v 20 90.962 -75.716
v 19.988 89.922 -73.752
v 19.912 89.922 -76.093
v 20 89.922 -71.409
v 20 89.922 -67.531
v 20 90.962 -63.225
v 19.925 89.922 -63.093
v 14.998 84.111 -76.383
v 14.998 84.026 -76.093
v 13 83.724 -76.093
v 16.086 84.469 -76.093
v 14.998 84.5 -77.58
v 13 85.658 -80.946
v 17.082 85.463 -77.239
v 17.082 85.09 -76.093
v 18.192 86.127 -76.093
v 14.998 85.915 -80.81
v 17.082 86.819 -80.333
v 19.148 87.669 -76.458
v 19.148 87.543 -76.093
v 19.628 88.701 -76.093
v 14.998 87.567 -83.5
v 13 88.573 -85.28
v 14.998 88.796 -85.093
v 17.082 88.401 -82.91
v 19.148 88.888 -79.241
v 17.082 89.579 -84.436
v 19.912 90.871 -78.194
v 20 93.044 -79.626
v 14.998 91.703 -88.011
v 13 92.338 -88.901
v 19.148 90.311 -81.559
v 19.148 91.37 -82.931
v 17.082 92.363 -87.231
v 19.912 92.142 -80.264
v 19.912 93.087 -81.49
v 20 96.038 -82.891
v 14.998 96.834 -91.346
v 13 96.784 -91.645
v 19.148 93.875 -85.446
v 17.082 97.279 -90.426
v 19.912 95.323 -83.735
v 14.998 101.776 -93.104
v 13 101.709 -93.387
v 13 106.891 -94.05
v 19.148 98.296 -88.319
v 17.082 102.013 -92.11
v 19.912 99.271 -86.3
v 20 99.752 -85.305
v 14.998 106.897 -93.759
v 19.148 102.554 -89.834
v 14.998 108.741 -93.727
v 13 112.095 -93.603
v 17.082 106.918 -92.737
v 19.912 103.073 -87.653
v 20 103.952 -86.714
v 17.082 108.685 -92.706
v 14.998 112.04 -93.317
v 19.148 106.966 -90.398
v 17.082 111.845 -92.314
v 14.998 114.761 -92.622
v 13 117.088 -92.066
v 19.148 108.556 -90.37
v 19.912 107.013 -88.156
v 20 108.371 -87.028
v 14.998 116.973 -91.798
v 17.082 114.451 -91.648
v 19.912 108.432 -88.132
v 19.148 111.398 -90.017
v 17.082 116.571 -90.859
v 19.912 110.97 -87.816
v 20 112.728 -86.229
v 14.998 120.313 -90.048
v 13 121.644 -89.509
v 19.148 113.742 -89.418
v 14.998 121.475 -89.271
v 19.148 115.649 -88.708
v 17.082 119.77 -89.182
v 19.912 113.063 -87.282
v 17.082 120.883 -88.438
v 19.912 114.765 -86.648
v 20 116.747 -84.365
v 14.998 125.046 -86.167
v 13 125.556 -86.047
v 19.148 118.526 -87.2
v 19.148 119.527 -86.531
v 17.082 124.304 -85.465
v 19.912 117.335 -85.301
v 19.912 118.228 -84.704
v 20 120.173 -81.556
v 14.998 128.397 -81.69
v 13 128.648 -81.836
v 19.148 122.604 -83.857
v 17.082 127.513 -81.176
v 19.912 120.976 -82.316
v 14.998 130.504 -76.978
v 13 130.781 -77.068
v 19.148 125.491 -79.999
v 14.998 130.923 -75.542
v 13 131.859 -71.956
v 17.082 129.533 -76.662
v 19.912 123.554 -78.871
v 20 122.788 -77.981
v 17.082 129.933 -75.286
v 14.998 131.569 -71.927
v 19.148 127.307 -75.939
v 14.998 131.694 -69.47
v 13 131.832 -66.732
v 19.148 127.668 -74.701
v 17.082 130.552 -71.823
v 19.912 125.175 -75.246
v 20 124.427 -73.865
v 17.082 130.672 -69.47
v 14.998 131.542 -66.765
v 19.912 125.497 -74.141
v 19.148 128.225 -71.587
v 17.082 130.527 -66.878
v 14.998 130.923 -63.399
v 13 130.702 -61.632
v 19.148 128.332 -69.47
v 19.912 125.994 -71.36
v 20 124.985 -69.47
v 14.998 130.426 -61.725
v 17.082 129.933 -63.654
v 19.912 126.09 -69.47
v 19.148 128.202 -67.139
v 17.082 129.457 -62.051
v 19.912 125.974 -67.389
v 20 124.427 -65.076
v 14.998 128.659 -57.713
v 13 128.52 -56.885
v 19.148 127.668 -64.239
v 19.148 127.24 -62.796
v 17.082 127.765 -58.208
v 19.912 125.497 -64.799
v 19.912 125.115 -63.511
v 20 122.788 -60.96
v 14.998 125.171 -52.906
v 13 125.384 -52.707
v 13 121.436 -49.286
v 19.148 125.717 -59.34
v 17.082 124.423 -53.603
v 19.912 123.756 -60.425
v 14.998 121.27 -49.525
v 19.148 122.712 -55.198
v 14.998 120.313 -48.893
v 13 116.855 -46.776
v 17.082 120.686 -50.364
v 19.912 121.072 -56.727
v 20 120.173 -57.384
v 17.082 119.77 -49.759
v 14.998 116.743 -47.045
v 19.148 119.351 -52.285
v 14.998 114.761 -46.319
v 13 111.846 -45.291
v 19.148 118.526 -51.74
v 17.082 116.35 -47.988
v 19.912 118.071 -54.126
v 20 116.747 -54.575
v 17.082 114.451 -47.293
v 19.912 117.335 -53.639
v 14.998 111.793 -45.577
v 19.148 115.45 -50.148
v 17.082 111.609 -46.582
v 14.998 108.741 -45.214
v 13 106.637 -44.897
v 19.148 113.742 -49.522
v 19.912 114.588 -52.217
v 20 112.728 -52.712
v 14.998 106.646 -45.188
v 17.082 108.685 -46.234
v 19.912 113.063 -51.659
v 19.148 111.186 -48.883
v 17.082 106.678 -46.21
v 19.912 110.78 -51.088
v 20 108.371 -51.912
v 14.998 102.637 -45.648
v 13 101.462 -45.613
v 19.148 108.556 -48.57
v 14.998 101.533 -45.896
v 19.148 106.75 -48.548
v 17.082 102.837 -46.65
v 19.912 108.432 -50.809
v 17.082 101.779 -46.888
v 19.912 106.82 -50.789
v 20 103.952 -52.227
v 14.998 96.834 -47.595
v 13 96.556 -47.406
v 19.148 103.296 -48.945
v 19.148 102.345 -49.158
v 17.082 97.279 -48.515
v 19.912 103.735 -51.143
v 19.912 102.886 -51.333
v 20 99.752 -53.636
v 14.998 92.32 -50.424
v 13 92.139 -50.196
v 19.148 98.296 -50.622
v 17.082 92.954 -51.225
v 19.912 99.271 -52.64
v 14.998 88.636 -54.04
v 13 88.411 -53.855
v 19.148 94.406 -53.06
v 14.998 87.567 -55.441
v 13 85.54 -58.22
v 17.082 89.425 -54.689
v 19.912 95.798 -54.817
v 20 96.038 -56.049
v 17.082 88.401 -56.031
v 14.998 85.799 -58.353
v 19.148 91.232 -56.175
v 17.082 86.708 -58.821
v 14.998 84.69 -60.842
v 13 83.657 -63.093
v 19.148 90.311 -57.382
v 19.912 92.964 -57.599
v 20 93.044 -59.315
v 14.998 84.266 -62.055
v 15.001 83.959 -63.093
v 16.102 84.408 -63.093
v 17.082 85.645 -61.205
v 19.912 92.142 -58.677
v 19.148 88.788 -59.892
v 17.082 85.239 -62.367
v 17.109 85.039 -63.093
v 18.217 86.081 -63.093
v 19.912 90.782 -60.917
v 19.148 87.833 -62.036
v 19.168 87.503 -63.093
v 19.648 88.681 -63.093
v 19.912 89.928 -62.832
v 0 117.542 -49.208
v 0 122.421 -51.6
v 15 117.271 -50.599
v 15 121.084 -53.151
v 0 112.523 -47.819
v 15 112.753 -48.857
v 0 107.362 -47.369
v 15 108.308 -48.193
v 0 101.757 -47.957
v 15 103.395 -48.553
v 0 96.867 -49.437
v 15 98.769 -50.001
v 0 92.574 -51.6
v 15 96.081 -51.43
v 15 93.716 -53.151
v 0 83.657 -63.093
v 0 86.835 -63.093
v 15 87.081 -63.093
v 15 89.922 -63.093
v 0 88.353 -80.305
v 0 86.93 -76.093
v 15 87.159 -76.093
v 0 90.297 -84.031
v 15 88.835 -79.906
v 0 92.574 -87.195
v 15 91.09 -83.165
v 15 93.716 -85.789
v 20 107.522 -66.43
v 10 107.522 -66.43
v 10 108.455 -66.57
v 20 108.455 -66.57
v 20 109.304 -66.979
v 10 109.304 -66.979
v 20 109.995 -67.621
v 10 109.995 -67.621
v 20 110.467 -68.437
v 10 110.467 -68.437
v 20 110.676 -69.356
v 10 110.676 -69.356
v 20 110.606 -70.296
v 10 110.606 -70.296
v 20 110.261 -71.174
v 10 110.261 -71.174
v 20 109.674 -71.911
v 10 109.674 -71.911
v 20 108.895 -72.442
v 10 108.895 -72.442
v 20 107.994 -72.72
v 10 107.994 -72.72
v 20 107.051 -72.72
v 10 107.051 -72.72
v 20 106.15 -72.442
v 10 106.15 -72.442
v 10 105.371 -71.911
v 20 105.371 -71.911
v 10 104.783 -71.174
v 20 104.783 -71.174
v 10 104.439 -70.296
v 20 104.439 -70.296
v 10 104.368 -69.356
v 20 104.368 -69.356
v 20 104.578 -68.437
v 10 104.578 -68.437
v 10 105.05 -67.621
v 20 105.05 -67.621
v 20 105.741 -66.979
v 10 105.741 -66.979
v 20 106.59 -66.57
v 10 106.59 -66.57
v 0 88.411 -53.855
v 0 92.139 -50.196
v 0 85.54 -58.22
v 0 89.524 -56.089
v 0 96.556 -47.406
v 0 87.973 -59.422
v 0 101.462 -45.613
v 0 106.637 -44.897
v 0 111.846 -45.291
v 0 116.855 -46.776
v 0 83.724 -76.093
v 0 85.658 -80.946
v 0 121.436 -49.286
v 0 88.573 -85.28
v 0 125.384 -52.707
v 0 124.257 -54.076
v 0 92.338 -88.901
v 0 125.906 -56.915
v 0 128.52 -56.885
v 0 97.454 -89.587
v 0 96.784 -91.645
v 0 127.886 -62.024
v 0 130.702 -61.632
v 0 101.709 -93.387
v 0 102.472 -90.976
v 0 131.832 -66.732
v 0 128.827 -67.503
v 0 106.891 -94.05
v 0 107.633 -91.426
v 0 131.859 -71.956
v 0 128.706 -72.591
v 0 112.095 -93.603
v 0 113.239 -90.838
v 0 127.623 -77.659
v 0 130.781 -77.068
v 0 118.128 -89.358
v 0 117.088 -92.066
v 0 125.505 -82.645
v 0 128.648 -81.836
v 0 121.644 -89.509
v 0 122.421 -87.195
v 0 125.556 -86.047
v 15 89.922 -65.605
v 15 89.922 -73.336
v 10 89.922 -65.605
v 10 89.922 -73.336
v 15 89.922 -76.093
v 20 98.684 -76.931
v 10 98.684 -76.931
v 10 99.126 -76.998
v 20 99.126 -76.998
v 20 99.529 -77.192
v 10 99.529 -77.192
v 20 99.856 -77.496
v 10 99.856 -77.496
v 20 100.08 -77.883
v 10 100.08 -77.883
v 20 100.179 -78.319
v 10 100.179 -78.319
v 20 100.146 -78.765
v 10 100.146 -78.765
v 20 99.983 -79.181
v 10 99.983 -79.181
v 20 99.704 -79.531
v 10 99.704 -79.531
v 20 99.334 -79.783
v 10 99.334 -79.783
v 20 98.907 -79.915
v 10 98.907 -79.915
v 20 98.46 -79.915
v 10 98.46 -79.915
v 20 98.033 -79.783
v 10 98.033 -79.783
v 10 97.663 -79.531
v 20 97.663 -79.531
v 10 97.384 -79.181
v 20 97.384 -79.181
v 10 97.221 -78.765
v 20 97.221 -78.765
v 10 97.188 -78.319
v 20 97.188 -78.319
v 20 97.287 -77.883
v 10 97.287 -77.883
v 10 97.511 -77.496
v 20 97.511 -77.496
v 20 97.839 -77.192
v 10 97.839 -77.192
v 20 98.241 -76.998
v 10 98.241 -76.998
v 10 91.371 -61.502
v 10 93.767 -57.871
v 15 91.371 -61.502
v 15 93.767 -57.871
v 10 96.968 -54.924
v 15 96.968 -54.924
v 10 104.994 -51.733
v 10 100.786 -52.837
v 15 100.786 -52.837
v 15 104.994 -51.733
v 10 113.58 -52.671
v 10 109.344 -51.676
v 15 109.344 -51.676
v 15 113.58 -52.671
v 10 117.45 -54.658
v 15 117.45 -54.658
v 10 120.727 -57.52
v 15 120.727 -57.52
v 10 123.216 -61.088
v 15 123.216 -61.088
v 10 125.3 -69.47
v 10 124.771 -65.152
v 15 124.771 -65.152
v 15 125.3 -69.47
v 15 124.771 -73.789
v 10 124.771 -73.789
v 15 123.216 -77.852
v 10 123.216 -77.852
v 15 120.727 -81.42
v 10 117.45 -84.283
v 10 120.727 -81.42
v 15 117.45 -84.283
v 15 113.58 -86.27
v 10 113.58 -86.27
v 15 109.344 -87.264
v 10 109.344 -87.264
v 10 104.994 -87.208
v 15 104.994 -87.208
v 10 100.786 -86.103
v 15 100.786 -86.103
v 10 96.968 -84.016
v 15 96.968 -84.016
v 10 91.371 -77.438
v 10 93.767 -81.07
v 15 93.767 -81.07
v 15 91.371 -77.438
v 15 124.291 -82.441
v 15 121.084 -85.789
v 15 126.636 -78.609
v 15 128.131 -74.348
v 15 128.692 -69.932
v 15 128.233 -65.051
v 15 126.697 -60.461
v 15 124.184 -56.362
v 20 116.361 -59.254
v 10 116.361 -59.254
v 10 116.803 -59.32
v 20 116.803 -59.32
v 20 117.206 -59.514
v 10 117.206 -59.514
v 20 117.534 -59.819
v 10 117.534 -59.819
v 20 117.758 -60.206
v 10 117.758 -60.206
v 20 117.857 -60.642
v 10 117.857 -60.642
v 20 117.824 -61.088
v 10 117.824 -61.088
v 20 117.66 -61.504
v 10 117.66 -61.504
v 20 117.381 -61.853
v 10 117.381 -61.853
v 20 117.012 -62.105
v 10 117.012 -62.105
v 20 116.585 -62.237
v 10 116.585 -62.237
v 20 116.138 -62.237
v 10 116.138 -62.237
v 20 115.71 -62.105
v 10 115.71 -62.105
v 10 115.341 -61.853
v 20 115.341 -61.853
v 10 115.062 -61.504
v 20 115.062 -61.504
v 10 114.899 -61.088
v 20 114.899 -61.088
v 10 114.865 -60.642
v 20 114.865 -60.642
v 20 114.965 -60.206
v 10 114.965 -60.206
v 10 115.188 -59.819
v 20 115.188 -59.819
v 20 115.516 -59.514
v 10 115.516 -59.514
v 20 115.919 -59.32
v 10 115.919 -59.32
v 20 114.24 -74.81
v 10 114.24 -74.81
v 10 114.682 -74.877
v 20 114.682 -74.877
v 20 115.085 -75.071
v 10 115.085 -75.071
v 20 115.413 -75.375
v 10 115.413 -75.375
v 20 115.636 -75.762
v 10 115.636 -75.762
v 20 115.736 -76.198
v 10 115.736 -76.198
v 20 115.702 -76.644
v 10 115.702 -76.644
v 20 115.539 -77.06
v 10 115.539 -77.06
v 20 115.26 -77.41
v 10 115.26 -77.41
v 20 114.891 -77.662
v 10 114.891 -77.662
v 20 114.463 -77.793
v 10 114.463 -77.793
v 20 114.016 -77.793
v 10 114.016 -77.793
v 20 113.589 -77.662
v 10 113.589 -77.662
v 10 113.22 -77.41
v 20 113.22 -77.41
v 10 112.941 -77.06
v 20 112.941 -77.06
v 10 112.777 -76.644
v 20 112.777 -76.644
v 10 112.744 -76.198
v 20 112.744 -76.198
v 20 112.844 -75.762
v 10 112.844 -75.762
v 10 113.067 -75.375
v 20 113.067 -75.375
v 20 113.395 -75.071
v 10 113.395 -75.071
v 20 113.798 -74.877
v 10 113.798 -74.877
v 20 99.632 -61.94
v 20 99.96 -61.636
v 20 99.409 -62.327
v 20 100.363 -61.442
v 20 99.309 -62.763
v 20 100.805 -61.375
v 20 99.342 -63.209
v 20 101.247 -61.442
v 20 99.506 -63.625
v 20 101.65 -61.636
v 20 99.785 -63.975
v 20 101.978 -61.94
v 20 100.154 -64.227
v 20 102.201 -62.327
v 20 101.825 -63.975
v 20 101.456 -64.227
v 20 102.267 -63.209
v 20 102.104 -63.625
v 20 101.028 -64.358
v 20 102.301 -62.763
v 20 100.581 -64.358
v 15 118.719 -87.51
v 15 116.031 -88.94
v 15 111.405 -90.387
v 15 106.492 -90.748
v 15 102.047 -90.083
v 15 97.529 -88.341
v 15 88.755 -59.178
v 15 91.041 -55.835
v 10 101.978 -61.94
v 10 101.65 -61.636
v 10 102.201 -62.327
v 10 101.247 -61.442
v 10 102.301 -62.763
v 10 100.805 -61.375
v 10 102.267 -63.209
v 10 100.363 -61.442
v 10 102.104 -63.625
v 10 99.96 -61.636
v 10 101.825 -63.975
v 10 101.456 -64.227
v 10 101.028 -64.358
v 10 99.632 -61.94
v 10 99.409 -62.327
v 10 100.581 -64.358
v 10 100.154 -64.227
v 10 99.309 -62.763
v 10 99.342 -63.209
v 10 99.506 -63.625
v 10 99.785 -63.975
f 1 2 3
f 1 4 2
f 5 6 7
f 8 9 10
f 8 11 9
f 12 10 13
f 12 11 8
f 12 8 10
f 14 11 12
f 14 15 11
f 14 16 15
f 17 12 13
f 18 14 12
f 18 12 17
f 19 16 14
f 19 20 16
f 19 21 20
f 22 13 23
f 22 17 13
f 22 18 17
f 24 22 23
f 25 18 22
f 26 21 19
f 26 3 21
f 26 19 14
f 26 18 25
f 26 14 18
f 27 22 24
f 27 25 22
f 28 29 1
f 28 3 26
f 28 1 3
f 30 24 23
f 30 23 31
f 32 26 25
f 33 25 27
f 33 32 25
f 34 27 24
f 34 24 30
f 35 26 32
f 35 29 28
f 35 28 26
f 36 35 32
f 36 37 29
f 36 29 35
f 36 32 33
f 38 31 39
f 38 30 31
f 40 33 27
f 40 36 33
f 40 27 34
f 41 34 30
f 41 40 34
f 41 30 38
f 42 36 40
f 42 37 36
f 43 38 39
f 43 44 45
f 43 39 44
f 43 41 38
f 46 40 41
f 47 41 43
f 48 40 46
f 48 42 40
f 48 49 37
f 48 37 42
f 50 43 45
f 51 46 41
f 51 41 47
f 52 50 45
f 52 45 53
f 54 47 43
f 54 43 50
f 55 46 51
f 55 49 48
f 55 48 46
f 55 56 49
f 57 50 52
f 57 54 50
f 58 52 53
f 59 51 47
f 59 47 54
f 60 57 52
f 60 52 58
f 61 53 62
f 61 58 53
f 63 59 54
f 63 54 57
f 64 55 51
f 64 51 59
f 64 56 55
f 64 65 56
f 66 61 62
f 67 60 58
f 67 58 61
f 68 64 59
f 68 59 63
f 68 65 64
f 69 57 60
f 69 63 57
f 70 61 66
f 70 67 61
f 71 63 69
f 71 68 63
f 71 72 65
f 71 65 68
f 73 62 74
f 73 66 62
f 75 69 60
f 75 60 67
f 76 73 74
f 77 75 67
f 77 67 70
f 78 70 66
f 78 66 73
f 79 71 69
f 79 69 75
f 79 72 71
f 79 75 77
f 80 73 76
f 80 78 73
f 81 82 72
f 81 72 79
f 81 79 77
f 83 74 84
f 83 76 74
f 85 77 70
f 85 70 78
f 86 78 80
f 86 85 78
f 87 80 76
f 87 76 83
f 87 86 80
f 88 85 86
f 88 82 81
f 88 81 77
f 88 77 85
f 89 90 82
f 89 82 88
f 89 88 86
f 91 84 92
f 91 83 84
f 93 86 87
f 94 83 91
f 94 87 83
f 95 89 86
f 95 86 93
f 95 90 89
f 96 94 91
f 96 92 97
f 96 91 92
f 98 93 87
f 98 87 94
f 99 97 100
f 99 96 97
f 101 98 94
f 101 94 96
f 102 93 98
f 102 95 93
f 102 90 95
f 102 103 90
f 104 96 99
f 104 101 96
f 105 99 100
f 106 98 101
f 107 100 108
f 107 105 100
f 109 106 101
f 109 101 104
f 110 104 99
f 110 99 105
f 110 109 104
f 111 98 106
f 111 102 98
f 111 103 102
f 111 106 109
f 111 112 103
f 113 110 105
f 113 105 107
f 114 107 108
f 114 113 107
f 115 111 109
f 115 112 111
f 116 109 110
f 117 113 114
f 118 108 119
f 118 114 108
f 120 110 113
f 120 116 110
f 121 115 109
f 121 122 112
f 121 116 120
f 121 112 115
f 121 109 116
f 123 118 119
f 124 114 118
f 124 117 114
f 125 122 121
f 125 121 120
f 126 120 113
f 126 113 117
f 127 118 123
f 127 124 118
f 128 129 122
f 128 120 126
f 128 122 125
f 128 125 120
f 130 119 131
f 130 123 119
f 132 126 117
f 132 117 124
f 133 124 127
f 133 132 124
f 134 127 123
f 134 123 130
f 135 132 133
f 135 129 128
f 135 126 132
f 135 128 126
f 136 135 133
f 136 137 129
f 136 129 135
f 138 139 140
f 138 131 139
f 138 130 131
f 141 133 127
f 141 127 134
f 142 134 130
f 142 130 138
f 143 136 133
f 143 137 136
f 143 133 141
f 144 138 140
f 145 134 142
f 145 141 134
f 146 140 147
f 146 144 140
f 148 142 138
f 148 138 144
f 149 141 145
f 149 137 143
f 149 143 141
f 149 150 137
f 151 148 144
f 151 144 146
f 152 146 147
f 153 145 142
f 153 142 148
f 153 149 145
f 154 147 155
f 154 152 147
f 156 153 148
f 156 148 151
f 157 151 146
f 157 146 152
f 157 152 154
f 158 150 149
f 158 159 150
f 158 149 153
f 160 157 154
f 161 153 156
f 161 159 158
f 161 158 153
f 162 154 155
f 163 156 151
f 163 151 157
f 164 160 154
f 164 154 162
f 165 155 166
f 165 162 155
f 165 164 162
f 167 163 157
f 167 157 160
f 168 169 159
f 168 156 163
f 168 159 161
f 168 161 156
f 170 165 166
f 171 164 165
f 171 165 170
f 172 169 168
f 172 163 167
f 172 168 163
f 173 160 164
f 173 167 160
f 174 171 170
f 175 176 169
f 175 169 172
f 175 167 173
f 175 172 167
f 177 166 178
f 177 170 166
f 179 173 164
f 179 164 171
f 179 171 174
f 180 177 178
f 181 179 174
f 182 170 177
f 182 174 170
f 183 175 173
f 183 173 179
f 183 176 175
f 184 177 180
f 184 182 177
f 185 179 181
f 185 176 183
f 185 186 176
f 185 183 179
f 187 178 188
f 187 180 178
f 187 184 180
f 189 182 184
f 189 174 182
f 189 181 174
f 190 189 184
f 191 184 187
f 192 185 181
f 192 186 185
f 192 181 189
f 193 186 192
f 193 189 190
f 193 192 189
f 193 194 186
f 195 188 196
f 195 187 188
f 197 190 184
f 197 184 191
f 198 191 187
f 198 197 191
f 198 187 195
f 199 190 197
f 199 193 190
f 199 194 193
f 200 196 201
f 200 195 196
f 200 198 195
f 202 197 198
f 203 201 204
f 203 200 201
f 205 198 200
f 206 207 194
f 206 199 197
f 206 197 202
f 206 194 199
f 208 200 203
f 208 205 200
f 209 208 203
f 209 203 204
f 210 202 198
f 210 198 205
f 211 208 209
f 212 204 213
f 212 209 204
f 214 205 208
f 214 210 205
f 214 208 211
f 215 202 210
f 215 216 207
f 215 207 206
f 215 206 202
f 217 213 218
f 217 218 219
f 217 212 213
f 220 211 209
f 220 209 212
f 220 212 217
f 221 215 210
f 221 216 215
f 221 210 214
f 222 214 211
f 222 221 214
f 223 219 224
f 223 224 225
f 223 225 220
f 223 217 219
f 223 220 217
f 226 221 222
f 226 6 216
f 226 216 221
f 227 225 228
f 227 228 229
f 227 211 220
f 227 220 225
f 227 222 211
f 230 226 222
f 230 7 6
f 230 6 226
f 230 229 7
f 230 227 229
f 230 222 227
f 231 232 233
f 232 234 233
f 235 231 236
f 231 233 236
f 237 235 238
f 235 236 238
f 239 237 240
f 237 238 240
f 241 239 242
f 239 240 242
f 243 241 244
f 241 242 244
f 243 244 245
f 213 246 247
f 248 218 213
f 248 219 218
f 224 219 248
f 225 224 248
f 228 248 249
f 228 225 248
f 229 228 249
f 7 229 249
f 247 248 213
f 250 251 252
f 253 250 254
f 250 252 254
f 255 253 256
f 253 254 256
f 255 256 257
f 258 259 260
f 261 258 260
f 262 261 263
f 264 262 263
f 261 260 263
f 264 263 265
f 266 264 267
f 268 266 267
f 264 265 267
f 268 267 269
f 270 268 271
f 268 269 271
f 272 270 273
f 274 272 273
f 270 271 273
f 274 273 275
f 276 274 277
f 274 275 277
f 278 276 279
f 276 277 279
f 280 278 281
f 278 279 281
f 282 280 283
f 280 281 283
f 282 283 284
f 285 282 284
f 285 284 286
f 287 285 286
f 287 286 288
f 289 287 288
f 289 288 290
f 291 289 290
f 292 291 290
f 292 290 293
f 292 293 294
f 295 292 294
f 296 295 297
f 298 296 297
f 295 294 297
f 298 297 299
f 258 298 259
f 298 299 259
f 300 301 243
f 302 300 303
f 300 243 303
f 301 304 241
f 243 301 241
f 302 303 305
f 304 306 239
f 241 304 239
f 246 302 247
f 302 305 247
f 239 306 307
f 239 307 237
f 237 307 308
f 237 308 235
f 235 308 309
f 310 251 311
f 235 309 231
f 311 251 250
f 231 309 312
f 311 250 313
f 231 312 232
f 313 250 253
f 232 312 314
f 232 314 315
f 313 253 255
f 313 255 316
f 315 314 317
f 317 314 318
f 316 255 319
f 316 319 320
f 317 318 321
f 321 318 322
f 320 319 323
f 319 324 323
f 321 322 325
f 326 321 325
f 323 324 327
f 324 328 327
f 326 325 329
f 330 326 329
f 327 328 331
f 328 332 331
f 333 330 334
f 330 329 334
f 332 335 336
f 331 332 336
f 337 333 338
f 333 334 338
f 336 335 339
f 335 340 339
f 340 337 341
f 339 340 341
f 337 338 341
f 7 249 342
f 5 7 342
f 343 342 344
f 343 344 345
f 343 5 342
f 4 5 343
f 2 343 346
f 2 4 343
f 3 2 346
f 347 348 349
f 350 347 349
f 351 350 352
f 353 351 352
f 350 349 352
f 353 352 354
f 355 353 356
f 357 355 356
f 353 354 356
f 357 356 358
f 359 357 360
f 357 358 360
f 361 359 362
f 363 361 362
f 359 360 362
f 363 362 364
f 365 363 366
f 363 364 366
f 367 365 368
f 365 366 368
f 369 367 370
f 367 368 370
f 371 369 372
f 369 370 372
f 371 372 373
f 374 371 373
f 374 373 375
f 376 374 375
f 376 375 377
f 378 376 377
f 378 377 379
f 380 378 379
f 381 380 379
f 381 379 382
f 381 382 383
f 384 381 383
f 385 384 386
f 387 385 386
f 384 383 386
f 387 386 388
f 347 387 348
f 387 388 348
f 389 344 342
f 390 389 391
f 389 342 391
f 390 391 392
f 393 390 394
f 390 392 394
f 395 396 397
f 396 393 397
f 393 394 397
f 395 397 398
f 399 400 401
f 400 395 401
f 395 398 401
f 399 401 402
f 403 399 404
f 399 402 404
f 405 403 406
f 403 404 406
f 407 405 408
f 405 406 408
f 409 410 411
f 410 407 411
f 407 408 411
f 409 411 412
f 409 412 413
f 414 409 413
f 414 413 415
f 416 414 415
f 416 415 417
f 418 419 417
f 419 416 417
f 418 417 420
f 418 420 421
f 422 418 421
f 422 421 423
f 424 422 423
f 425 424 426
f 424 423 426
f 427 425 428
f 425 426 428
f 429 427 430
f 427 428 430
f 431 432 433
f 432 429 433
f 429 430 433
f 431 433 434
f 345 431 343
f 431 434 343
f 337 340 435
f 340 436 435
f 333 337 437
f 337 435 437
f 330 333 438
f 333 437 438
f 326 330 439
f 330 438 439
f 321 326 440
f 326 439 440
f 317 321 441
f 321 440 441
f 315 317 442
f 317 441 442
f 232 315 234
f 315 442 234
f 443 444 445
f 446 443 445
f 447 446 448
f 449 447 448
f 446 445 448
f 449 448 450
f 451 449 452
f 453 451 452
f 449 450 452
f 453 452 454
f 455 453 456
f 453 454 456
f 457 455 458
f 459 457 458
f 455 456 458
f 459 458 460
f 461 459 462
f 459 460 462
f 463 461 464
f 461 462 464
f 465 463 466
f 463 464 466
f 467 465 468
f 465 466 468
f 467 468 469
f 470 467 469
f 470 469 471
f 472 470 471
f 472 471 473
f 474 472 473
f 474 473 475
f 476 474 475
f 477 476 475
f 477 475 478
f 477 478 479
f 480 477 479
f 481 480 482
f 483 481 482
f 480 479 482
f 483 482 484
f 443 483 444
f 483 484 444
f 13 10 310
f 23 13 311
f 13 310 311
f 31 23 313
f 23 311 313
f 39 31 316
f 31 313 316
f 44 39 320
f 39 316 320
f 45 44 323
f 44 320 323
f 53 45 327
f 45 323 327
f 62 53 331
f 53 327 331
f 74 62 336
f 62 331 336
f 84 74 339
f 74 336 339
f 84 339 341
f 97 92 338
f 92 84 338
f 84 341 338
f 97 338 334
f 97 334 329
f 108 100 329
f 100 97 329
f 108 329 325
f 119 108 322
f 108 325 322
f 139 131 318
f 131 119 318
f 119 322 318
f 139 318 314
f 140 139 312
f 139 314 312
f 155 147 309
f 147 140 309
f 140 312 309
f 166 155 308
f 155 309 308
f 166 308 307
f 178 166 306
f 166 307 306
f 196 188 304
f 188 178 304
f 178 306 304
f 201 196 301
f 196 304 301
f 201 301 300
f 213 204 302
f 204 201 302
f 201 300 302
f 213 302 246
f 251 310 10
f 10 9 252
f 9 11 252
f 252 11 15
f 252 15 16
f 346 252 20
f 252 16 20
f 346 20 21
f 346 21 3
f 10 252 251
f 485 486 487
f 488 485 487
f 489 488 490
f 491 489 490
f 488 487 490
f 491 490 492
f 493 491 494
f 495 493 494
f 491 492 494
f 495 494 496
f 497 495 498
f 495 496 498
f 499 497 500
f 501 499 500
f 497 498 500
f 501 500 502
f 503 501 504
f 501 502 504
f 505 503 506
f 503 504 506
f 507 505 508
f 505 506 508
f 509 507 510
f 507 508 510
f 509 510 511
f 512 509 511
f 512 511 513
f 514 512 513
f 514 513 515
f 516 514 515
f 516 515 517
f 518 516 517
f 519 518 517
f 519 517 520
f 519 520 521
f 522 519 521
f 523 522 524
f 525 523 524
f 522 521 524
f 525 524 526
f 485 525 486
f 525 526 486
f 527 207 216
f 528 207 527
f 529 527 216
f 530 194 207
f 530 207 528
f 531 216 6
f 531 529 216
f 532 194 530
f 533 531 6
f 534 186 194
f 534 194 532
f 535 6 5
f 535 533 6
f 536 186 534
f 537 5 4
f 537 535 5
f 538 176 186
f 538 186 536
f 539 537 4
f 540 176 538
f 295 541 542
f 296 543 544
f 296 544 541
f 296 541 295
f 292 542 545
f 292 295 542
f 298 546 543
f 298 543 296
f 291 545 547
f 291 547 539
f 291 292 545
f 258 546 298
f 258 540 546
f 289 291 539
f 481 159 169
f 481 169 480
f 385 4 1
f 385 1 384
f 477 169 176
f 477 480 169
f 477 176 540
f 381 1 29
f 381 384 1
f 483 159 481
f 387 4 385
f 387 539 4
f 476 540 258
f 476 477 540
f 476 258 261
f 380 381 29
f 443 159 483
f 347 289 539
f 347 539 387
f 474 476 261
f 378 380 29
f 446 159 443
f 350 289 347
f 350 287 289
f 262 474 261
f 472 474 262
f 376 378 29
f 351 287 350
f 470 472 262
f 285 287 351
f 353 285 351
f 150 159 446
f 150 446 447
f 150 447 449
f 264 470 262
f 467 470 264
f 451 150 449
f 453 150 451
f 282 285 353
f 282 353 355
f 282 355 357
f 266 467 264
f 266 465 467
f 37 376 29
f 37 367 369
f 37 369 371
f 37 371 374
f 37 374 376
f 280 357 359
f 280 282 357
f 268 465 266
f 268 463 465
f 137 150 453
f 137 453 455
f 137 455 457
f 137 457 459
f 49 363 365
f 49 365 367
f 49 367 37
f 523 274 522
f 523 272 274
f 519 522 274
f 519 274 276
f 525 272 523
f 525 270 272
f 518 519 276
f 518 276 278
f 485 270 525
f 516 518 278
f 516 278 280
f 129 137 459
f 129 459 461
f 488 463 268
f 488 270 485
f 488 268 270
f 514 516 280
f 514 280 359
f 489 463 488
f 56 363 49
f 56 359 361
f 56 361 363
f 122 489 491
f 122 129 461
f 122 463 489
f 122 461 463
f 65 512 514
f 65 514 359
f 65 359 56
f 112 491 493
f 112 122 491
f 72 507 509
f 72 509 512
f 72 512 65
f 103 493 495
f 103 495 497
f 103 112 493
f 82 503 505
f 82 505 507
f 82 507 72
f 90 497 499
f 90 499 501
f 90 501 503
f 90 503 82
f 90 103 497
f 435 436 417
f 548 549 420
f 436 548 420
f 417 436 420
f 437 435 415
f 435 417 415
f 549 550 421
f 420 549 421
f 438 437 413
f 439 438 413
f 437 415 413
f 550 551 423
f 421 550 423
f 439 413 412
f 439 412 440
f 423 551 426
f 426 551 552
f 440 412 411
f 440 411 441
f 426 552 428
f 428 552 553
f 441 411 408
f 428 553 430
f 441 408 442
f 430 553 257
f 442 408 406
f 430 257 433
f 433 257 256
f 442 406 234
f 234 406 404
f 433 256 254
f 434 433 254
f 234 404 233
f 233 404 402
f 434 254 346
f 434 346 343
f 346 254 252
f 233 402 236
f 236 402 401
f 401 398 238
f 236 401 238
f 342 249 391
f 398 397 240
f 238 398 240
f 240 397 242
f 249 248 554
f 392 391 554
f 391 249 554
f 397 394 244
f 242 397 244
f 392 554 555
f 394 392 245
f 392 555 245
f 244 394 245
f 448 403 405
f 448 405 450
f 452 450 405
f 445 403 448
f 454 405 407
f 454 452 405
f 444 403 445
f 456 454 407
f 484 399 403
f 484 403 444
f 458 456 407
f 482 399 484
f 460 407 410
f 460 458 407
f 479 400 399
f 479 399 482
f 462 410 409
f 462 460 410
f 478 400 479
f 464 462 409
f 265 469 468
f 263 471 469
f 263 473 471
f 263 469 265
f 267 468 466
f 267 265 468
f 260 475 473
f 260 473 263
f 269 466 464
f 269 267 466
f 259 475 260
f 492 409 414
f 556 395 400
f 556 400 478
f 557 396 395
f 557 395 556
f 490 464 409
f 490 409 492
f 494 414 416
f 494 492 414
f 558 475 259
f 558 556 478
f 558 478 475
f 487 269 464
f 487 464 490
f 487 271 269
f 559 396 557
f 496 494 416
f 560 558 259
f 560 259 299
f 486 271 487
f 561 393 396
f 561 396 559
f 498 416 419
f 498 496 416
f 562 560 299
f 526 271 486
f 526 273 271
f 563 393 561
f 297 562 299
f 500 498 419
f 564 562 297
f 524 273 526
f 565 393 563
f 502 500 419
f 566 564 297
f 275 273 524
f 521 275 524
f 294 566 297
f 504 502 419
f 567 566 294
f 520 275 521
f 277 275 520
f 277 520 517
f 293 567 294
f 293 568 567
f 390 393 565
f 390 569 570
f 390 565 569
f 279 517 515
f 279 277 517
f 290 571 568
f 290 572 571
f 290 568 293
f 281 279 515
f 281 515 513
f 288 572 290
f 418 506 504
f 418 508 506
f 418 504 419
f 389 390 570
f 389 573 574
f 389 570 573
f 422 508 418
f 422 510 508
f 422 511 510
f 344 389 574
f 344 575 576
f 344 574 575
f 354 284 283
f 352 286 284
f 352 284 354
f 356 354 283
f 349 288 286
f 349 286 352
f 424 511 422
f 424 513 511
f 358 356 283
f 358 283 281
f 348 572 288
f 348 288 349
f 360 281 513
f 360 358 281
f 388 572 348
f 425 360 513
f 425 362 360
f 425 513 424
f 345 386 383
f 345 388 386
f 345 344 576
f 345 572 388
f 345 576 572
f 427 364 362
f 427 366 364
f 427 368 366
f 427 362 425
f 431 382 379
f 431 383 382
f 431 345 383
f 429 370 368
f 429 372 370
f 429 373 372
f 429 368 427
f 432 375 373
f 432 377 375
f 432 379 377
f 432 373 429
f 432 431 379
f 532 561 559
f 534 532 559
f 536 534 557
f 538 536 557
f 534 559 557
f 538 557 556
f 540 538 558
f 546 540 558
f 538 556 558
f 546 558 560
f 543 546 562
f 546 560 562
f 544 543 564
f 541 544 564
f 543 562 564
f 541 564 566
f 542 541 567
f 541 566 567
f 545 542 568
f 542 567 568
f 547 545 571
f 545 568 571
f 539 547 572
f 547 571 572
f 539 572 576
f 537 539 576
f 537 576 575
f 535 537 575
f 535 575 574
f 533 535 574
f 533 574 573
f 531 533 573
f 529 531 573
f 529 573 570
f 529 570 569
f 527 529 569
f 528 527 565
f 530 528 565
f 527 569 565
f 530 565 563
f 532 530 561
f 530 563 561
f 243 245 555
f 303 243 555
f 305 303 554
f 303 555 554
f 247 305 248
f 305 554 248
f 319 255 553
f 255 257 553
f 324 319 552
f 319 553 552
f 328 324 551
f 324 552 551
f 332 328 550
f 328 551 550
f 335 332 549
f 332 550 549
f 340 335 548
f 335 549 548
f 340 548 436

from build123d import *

# Parameters (mm, degrees)
SKETCH1_R           = 24.584865892
BOSS_EXTRUDE4_DEPTH = 20
SKETCH5_R           = 17.9
BOSS_EXTRUDE5_DEPTH = 5
SKETCH6_R           = 1.5
SKETCH6_R_2         = 3.162859367
CUT_EXTRUDE1_DEPTH  = 10
FILLET1_R           = 7
SKETCH8_W           = 13
SKETCH8_H           = 8.974684843
CUT_EXTRUDE2_DEPTH  = 30


with BuildPart() as part:
    # Sketch1 → Boss-Extrude4 (new body)
    with BuildSketch(Plane(origin=(0, 0, 0), x_dir=(0, 0, -1), z_dir=(1, 0, 0))):
        with Locations((69.470275966, 107.4)):
            Circle(SKETCH1_R)
    extrude(amount=BOSS_EXTRUDE4_DEPTH)

    # Cut-Loft1: read off the stored shape, not the designer's step
    # Cut-Loft1: loft between two sections, ruled curve by curve
    cut_loft1_from = [
        Edge.make_bspline([(0, 122.421030793, -51.5998214), (0, 121.403963567, -50.977061653), (0, 120.31454314, -50.395752434), (0, 118.005938422, -49.358232659), (0, 116.786749472, -48.902260973), (0, 114.249384519, -48.15409937), (0, 112.931336418, -47.862145319), (0, 110.241321726, -47.469427252), (0, 108.869602219, -47.368811755), (0, 106.125867826, -47.368811755), (0, 104.754148319, -47.469427252), (0, 102.064133627, -47.862145319), (0, 100.746085526, -48.15409937), (0, 98.208720572, -48.902260973), (0, 96.989531623, -49.358232659), (0, 94.680926905, -50.395752434), (0, 93.591506478, -50.977061653), (0, 92.574439252, -51.5998214)], [0, 0, 0, 0, 0.125, 0.125, 0.25, 0.25, 0.375, 0.375, 0.5, 0.5, 0.625, 0.625, 0.75, 0.75, 0.875, 0.875, 1, 1, 1, 1], 3),
        Edge.make_bspline([(0, 92.574439252, -51.5998214), (0, 91.688670965, -52.66973324), (0, 90.833868812, -53.859032932), (0, 89.270225328, -56.474339023), (0, 88.562039976, -57.900649218), (0, 87.380791607, -60.949300184), (0, 86.90857847, -62.571462387), (0, 86.269439046, -65.928597857), (0, 86.103133633, -67.662819685), (0, 86.103133633, -71.132277338), (0, 86.269439046, -72.866499165), (0, 86.90857847, -76.223634636), (0, 87.380791607, -77.845796839), (0, 88.562039976, -80.894447804), (0, 89.270225328, -82.320757999), (0, 90.833868812, -84.93606409), (0, 91.688670965, -86.125363783), (0, 92.574439252, -87.195275623)], [0, 0, 0, 0, 0.125, 0.125, 0.25, 0.25, 0.375, 0.375, 0.5, 0.5, 0.625, 0.625, 0.75, 0.75, 0.875, 0.875, 1, 1, 1, 1], 3),
        Edge.make_bspline([(0, 122.421030793, -87.195275623), (0, 123.30679908, -86.125363783), (0, 124.161601233, -84.93606409), (0, 125.725244717, -82.320757999), (0, 126.433430069, -80.894447804), (0, 127.614678438, -77.845796839), (0, 128.086891575, -76.223634636), (0, 128.726030999, -72.866499165), (0, 128.892336412, -71.132277338), (0, 128.892336412, -67.662819685), (0, 128.726030999, -65.928597857), (0, 128.086891575, -62.571462387), (0, 127.614678438, -60.949300184), (0, 126.433430069, -57.900649218), (0, 125.725244717, -56.474339023), (0, 124.161601233, -53.859032932), (0, 123.30679908, -52.66973324), (0, 122.421030793, -51.5998214)], [0, 0, 0, 0, 0.125, 0.125, 0.25, 0.25, 0.375, 0.375, 0.5, 0.5, 0.625, 0.625, 0.75, 0.75, 0.875, 0.875, 1, 1, 1, 1], 3),
        Edge.make_bspline([(0, 92.574439252, -87.195275623), (0, 93.591506478, -87.818035369), (0, 94.680926905, -88.399344588), (0, 96.989531623, -89.436864364), (0, 98.208720572, -89.89283605), (0, 100.746085526, -90.640997653), (0, 102.064133627, -90.932951704), (0, 104.754148319, -91.325669771), (0, 106.125867826, -91.426285268), (0, 108.869602219, -91.426285268), (0, 110.241321726, -91.325669771), (0, 112.931336418, -90.932951704), (0, 114.249384519, -90.640997653), (0, 116.786749472, -89.89283605), (0, 118.005938422, -89.436864364), (0, 120.31454314, -88.399344588), (0, 121.403963567, -87.818035369), (0, 122.421030793, -87.195275623)], [0, 0, 0, 0, 0.125, 0.125, 0.25, 0.25, 0.375, 0.375, 0.5, 0.5, 0.625, 0.625, 0.75, 0.75, 0.875, 0.875, 1, 1, 1, 1], 3),
    ]
    cut_loft1_to = [
        Edge.make_bspline([(15, 121.083565639, -53.151068005), (15, 120.209787037, -52.418409479), (15, 119.250887023, -51.73451628), (15, 117.180423625, -50.51390478), (15, 116.06885476, -49.977467502), (15, 113.729261674, -49.097277381), (15, 112.501387925, -48.753802027), (15, 109.982206911, -48.291780772), (15, 108.691190331, -48.173409599), (15, 106.108809669, -48.173409599), (15, 104.817793089, -48.291780772), (15, 102.298612075, -48.753802027), (15, 101.070738326, -49.097277381), (15, 98.73114524, -49.977467502), (15, 97.619576375, -50.51390478), (15, 95.549112977, -51.73451628), (15, 94.590212963, -52.418409479), (15, 93.716434361, -53.151068005)], [0, 0, 0, 0, 0.125, 0.125, 0.25, 0.25, 0.375, 0.375, 0.5, 0.5, 0.625, 0.625, 0.75, 0.75, 0.875, 0.875, 1, 1, 1, 1], 3),
        Edge.make_bspline([(15, 93.716434361, -53.151068005), (15, 92.674354023, -54.024846606), (15, 91.668704432, -55.039081505), (15, 89.829123863, -57.346029779), (15, 88.995964625, -58.639100564), (15, 87.606260661, -61.455866338), (15, 87.050715794, -62.979351249), (15, 86.29878706, -66.15903997), (15, 86.103133633, -67.814359733), (15, 86.103133633, -71.126192199), (15, 86.29878706, -72.781511962), (15, 87.050715794, -75.961200683), (15, 87.606260661, -77.484685594), (15, 88.995964625, -80.301451369), (15, 89.829123863, -81.594522153), (15, 91.668704432, -83.901470427), (15, 92.674354023, -84.915705326), (15, 93.716434361, -85.789483927)], [0, 0, 0, 0, 0.125, 0.125, 0.25, 0.25, 0.375, 0.375, 0.5, 0.5, 0.625, 0.625, 0.75, 0.75, 0.875, 0.875, 1, 1, 1, 1], 3),
        Edge.make_bspline([(15, 121.083565639, -85.789483927), (15, 122.125645977, -84.915705326), (15, 123.131295568, -83.901470427), (15, 124.970876137, -81.594522153), (15, 125.804035375, -80.301451369), (15, 127.193739339, -77.484685594), (15, 127.749284206, -75.961200683), (15, 128.50121294, -72.781511962), (15, 128.696866367, -71.126192199), (15, 128.696866367, -67.814359733), (15, 128.50121294, -66.15903997), (15, 127.749284206, -62.979351249), (15, 127.193739339, -61.455866338), (15, 125.804035375, -58.639100564), (15, 124.970876137, -57.346029779), (15, 123.131295568, -55.039081505), (15, 122.125645977, -54.024846606), (15, 121.083565639, -53.151068005)], [0, 0, 0, 0, 0.125, 0.125, 0.25, 0.25, 0.375, 0.375, 0.5, 0.5, 0.625, 0.625, 0.75, 0.75, 0.875, 0.875, 1, 1, 1, 1], 3),
        Edge.make_bspline([(15, 93.716434361, -85.789483927), (15, 94.590212963, -86.522142453), (15, 95.549112977, -87.206035652), (15, 97.619576375, -88.426647153), (15, 98.73114524, -88.96308443), (15, 101.070738326, -89.843274551), (15, 102.298612075, -90.186749905), (15, 104.817793089, -90.64877116), (15, 106.108809669, -90.767142333), (15, 108.691190331, -90.767142333), (15, 109.982206911, -90.64877116), (15, 112.501387925, -90.186749905), (15, 113.729261674, -89.843274551), (15, 116.06885476, -88.96308443), (15, 117.180423625, -88.426647153), (15, 119.250887023, -87.206035652), (15, 120.209787037, -86.522142453), (15, 121.083565639, -85.789483927)], [0, 0, 0, 0, 0.125, 0.125, 0.25, 0.25, 0.375, 0.375, 0.5, 0.5, 0.625, 0.625, 0.75, 0.75, 0.875, 0.875, 1, 1, 1, 1], 3),
    ]
    cut_loft1 = Solid(Shell([*[Face.make_surface_from_curves(cut_loft1_from[k], cut_loft1_to[k]) for k in range(4)], Face(Wire(cut_loft1_from)), Face(Wire(cut_loft1_to))]))
    add(cut_loft1, mode=Mode.SUBTRACT)

    # Sketch5 → Boss-Extrude5 (add)
    with BuildSketch(Plane.ZY.offset(-15)):
        with Locations(Location((-69.470275966, 107.4, 0), (0, 0, 180))):
            Circle(SKETCH5_R)
    extrude(amount=BOSS_EXTRUDE5_DEPTH)

    # Sketch6 → Cut-Extrude1 (cut)
    with BuildSketch(Plane.ZY.offset(-10)):
        with Locations((-60.753803406, 116.36119697)):
            Circle(SKETCH6_R)
        with Locations((-78.431472936, 98.68352744)):
            Circle(SKETCH6_R)
        with Locations((-76.310152592, 114.239876626)):
            Circle(SKETCH6_R)
        with Locations((-62.87512375, 100.804847784)):
            Circle(SKETCH6_R)
        with Locations((-69.592638171, 107.522362205)):
            Circle(SKETCH6_R_2)
    extrude(amount=-CUT_EXTRUDE1_DEPTH, mode=Mode.SUBTRACT)

    # Fillet1
    fillet1_edges = [part.edges().sort_by_distance(p)[0] for p in [
        (20, 107.4, -44.885410074),
    ]]
    fillet(fillet1_edges, radius=FILLET1_R)

    # Sketch8 → Cut-Extrude2 (cut)
    with BuildSketch(Plane(origin=(20, 0, 0), x_dir=(0, 0, -1), z_dir=(1, 0, 0))):
        with Locations((69.592638171, 85.435019783)):
            Rectangle(SKETCH8_W, SKETCH8_H)
    extrude(amount=-CUT_EXTRUDE2_DEPTH, mode=Mode.SUBTRACT)


solid = part.part
